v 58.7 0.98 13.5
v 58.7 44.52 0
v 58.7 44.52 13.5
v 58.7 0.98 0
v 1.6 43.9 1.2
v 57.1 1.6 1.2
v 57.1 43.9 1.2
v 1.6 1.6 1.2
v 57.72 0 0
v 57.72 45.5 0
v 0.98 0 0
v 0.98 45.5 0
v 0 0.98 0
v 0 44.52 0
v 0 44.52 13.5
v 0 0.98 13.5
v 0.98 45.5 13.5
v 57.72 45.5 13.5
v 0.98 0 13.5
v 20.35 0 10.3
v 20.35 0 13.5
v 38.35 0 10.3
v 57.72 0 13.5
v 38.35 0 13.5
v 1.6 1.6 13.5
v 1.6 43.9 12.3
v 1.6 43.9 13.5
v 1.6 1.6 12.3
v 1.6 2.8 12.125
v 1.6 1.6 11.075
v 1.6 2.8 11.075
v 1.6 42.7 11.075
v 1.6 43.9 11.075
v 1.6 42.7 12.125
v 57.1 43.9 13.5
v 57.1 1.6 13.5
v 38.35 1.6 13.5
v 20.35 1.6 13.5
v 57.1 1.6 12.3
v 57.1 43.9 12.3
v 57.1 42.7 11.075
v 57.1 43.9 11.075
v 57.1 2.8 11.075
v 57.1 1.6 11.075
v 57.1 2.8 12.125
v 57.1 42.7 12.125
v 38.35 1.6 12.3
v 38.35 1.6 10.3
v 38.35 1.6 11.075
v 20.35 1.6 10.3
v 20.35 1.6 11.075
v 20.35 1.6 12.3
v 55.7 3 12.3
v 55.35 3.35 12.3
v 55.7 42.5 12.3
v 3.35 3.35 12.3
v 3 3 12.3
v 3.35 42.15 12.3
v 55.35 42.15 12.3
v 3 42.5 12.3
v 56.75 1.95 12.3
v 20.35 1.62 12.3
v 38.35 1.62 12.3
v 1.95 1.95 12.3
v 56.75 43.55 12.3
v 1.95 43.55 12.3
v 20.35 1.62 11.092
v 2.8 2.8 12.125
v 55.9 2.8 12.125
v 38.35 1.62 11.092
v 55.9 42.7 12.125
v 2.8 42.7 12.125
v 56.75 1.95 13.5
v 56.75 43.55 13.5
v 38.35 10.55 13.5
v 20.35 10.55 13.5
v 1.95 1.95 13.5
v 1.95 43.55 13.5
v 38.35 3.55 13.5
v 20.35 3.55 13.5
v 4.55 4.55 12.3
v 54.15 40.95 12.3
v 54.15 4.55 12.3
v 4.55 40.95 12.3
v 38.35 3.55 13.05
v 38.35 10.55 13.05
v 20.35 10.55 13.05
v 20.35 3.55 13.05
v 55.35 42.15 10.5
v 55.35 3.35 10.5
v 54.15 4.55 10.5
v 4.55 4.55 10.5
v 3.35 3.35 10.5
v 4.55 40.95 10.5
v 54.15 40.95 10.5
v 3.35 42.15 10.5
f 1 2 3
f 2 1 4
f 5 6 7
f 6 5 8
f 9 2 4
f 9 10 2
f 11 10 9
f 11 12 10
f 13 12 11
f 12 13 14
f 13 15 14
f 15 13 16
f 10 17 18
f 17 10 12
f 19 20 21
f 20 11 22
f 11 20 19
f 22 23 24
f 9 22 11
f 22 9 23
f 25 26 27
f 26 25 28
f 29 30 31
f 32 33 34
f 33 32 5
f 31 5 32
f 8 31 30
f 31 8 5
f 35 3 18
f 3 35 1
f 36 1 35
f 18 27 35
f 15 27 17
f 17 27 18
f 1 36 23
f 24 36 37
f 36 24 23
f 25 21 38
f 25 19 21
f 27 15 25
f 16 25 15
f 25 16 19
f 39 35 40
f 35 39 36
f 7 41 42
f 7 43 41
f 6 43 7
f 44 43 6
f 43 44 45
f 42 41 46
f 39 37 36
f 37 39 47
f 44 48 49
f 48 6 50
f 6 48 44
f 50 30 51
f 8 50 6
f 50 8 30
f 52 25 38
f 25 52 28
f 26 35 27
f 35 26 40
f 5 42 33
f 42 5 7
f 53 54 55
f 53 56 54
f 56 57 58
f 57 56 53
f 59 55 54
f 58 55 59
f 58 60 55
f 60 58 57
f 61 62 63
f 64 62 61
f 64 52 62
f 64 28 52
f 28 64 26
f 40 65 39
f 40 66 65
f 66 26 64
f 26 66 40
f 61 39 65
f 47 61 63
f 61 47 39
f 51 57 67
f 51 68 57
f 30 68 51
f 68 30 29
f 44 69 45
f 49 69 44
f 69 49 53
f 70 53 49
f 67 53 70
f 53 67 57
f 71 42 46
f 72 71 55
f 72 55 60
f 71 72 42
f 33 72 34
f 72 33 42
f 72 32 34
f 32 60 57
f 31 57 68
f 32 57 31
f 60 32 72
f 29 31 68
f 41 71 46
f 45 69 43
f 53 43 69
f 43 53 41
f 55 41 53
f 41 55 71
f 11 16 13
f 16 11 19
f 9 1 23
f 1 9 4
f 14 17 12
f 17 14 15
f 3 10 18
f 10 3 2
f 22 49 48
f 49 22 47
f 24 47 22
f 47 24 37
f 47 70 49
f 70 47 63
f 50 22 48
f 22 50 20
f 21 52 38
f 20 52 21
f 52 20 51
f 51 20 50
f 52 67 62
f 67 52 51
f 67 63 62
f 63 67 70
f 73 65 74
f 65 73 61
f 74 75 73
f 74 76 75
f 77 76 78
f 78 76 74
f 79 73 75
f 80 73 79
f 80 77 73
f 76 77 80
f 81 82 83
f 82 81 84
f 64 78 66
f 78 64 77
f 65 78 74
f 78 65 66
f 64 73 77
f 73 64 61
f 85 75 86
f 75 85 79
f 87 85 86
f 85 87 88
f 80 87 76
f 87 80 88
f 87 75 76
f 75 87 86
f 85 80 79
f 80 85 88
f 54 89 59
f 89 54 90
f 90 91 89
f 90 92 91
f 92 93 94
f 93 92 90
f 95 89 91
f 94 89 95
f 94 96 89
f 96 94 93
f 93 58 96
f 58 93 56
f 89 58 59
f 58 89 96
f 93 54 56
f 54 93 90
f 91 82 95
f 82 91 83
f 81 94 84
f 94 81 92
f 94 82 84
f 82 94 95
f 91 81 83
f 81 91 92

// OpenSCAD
// 盲人取药机 - 低矮药盒子（嵌入式扣盖方案）
// 适配内部空间 61.1 x 47.9mm，总高度 13.5mm。
// 盒体顶部有盖子沉台，盖子放入后与盒体顶部齐平。
// part_id 可选：0=闭合装配示意，1=盒体，2=嵌入盖打印方向，3=打开示意。

part_id = 0;

space_w = 61.1;          // 可用内部宽度
space_d = 47.9;          // 可用内部深度
fit_clearance = 1.2;     // 每侧自由下落公差，FDM打印后不容易卡住

box_w = space_w - 2 * fit_clearance;
box_d = space_d - 2 * fit_clearance;
box_h = 13.5;

wall = 1.6;
bottom_t = 1.2;
corner_chamfer = 1.0;    // 外侧竖角倒角，避免斜着下落时卡角

lid_t = 1.2;             // 盖板厚度，闭合后占用盒体顶部沉台
lid_xy_clearance = 0.35; // 盖板与盒体内壁的单边间隙，适合FDM打印

seat_depth = 1.4;        // 托台向内伸出的宽度
seat_slope_h = 1.4;      // 托台下方45度斜撑高度，避免悬空
seat_overlap = 0.2;      // 托台嵌入侧墙，避免贴面导致非流形
seat_z = box_h - lid_t;  // 盖板底面高度，盖上后顶面齐平到 13.5mm

skirt_h = 1.8;           // 盖子下方内塞裙边高度，防运输漏药
skirt_wall = 1.2;        // 至少约3条0.4mm线宽，更稳
skirt_clearance = 0.35;

front_pick_w = 18;       // 前侧取盖缺口宽度
front_pick_h = 3.2;      // 前侧取盖缺口高度
lid_grip_depth = 0.45;   // 盖面浅槽深度，不打穿盖子

eps = 0.02;

inner_w = box_w - 2 * wall;
inner_d = box_d - 2 * wall;

lid_w = inner_w - 2 * lid_xy_clearance;
lid_d = inner_d - 2 * lid_xy_clearance;
lid_x = wall + lid_xy_clearance;
lid_y = wall + lid_xy_clearance;

seat_inner_w = inner_w - 2 * seat_depth;
seat_inner_d = inner_d - 2 * seat_depth;
skirt_w = seat_inner_w - 2 * skirt_clearance;
skirt_d = seat_inner_d - 2 * skirt_clearance;
skirt_x = (lid_w - skirt_w) / 2;
skirt_y = (lid_d - skirt_d) / 2;

module x_seat_rail(len) {
    z0 = seat_z - seat_slope_h;
    z1 = seat_z;

    polyhedron(
        points=[
            [-seat_overlap, -seat_overlap, z0],
            [-seat_overlap, -seat_overlap, z1],
            [-seat_overlap, seat_depth, z1],
            [len + seat_overlap, -seat_overlap, z0],
            [len + seat_overlap, -seat_overlap, z1],
            [len + seat_overlap, seat_depth, z1]
        ],
        faces=[
            [0, 3, 4, 1],
            [1, 4, 5, 2],
            [0, 2, 5, 3],
            [0, 1, 2],
            [3, 5, 4]
        ]
    );
}

module y_seat_rail(len) {
    z0 = seat_z - seat_slope_h;
    z1 = seat_z;

    polyhedron(
        points=[
            [-seat_overlap, -seat_overlap, z0],
            [-seat_overlap, -seat_overlap, z1],
            [seat_depth, -seat_overlap, z1],
            [-seat_overlap, len + seat_overlap, z0],
            [-seat_overlap, len + seat_overlap, z1],
            [seat_depth, len + seat_overlap, z1]
        ],
        faces=[
            [0, 3, 4, 1],
            [1, 4, 5, 2],
            [0, 2, 5, 3],
            [0, 1, 2],
            [3, 5, 4]
        ]
    );
}

module raw_body() {
    union() {
        // 底板
        cube([box_w, box_d, bottom_t], center=false);

        // 四面完整侧墙
        cube([wall, box_d, box_h], center=false);
        translate([box_w - wall, 0, 0])
            cube([wall, box_d, box_h], center=false);
        cube([box_w, wall, box_h], center=false);
        translate([0, box_d - wall, 0])
            cube([box_w, wall, box_h], center=false);

        // 盖子托台：45度斜撑托住盖板，直立打印无需支撑。
        translate([wall, wall, 0])
            x_seat_rail(inner_w);
        translate([wall, box_d - wall, 0])
            mirror([0, 1, 0])
                x_seat_rail(inner_w);
        translate([wall, wall + seat_depth, 0])
            y_seat_rail(inner_d - 2 * seat_depth);
        translate([box_w - wall, wall + seat_depth, 0])
            mirror([1, 0, 0])
                y_seat_rail(inner_d - 2 * seat_depth);
    }
}

module outer_corner_chamfers() {
    translate([0, 0, -eps])
        linear_extrude(height=box_h + 2 * eps)
            polygon([
                [-eps, -eps],
                [corner_chamfer, -eps],
                [-eps, corner_chamfer]
            ]);

    translate([0, 0, -eps])
        linear_extrude(height=box_h + 2 * eps)
            polygon([
                [box_w + eps, -eps],
                [box_w - corner_chamfer, -eps],
                [box_w + eps, corner_chamfer]
            ]);

    translate([0, 0, -eps])
        linear_extrude(height=box_h + 2 * eps)
            polygon([
                [-eps, box_d + eps],
                [corner_chamfer, box_d + eps],
                [-eps, box_d - corner_chamfer]
            ]);

    translate([0, 0, -eps])
        linear_extrude(height=box_h + 2 * eps)
            polygon([
                [box_w + eps, box_d + eps],
                [box_w - corner_chamfer, box_d + eps],
                [box_w + eps, box_d - corner_chamfer]
            ]);
}

module box_body() {
    difference() {
        raw_body();

        // 前侧开一个小缺口，方便手指掀起嵌入式盖子。
        translate([(box_w - front_pick_w) / 2, -eps, box_h - front_pick_h])
            cube([front_pick_w, wall + 2 * eps, front_pick_h + eps], center=false);

        outer_corner_chamfers();
    }
}

module lid_skirt() {
    difference() {
        cube([skirt_w, skirt_d, skirt_h], center=false);

        translate([skirt_wall, skirt_wall, -eps])
            cube([
                skirt_w - 2 * skirt_wall,
                skirt_d - 2 * skirt_wall,
                skirt_h + 2 * eps
            ], center=false);
    }
}

module inset_lid() {
    union() {
        difference() {
            translate([0, 0, skirt_h])
                cube([lid_w, lid_d, lid_t], center=false);

            // 顶部浅槽，便于抠起盖子；不打穿盖板。
            translate([(lid_w - 18) / 2, 1.6, skirt_h + lid_t - lid_grip_depth])
                cube([18, 7, lid_grip_depth + eps], center=false);
        }

        translate([skirt_x, skirt_y, 0])
            lid_skirt();
    }
}

module inset_lid_print_orientation() {
    // 盖子单独打印时顶面朝下，盖板贴热床，内塞裙边向上生长。
    translate([0, lid_d, skirt_h + lid_t])
        rotate([180, 0, 0])
            inset_lid();
}

module closed_assembly() {
    box_body();
    translate([lid_x, lid_y, seat_z - skirt_h])
        inset_lid();
}

module open_demo_assembly() {
    box_body();
    translate([lid_x, lid_y - 8, box_h + 4])
        inset_lid();
}

if (part_id == 1) {
    box_body();
} else if (part_id == 2) {
    inset_lid_print_orientation();
} else if (part_id == 3) {
    open_demo_assembly();
} else {
    closed_assembly();
}
